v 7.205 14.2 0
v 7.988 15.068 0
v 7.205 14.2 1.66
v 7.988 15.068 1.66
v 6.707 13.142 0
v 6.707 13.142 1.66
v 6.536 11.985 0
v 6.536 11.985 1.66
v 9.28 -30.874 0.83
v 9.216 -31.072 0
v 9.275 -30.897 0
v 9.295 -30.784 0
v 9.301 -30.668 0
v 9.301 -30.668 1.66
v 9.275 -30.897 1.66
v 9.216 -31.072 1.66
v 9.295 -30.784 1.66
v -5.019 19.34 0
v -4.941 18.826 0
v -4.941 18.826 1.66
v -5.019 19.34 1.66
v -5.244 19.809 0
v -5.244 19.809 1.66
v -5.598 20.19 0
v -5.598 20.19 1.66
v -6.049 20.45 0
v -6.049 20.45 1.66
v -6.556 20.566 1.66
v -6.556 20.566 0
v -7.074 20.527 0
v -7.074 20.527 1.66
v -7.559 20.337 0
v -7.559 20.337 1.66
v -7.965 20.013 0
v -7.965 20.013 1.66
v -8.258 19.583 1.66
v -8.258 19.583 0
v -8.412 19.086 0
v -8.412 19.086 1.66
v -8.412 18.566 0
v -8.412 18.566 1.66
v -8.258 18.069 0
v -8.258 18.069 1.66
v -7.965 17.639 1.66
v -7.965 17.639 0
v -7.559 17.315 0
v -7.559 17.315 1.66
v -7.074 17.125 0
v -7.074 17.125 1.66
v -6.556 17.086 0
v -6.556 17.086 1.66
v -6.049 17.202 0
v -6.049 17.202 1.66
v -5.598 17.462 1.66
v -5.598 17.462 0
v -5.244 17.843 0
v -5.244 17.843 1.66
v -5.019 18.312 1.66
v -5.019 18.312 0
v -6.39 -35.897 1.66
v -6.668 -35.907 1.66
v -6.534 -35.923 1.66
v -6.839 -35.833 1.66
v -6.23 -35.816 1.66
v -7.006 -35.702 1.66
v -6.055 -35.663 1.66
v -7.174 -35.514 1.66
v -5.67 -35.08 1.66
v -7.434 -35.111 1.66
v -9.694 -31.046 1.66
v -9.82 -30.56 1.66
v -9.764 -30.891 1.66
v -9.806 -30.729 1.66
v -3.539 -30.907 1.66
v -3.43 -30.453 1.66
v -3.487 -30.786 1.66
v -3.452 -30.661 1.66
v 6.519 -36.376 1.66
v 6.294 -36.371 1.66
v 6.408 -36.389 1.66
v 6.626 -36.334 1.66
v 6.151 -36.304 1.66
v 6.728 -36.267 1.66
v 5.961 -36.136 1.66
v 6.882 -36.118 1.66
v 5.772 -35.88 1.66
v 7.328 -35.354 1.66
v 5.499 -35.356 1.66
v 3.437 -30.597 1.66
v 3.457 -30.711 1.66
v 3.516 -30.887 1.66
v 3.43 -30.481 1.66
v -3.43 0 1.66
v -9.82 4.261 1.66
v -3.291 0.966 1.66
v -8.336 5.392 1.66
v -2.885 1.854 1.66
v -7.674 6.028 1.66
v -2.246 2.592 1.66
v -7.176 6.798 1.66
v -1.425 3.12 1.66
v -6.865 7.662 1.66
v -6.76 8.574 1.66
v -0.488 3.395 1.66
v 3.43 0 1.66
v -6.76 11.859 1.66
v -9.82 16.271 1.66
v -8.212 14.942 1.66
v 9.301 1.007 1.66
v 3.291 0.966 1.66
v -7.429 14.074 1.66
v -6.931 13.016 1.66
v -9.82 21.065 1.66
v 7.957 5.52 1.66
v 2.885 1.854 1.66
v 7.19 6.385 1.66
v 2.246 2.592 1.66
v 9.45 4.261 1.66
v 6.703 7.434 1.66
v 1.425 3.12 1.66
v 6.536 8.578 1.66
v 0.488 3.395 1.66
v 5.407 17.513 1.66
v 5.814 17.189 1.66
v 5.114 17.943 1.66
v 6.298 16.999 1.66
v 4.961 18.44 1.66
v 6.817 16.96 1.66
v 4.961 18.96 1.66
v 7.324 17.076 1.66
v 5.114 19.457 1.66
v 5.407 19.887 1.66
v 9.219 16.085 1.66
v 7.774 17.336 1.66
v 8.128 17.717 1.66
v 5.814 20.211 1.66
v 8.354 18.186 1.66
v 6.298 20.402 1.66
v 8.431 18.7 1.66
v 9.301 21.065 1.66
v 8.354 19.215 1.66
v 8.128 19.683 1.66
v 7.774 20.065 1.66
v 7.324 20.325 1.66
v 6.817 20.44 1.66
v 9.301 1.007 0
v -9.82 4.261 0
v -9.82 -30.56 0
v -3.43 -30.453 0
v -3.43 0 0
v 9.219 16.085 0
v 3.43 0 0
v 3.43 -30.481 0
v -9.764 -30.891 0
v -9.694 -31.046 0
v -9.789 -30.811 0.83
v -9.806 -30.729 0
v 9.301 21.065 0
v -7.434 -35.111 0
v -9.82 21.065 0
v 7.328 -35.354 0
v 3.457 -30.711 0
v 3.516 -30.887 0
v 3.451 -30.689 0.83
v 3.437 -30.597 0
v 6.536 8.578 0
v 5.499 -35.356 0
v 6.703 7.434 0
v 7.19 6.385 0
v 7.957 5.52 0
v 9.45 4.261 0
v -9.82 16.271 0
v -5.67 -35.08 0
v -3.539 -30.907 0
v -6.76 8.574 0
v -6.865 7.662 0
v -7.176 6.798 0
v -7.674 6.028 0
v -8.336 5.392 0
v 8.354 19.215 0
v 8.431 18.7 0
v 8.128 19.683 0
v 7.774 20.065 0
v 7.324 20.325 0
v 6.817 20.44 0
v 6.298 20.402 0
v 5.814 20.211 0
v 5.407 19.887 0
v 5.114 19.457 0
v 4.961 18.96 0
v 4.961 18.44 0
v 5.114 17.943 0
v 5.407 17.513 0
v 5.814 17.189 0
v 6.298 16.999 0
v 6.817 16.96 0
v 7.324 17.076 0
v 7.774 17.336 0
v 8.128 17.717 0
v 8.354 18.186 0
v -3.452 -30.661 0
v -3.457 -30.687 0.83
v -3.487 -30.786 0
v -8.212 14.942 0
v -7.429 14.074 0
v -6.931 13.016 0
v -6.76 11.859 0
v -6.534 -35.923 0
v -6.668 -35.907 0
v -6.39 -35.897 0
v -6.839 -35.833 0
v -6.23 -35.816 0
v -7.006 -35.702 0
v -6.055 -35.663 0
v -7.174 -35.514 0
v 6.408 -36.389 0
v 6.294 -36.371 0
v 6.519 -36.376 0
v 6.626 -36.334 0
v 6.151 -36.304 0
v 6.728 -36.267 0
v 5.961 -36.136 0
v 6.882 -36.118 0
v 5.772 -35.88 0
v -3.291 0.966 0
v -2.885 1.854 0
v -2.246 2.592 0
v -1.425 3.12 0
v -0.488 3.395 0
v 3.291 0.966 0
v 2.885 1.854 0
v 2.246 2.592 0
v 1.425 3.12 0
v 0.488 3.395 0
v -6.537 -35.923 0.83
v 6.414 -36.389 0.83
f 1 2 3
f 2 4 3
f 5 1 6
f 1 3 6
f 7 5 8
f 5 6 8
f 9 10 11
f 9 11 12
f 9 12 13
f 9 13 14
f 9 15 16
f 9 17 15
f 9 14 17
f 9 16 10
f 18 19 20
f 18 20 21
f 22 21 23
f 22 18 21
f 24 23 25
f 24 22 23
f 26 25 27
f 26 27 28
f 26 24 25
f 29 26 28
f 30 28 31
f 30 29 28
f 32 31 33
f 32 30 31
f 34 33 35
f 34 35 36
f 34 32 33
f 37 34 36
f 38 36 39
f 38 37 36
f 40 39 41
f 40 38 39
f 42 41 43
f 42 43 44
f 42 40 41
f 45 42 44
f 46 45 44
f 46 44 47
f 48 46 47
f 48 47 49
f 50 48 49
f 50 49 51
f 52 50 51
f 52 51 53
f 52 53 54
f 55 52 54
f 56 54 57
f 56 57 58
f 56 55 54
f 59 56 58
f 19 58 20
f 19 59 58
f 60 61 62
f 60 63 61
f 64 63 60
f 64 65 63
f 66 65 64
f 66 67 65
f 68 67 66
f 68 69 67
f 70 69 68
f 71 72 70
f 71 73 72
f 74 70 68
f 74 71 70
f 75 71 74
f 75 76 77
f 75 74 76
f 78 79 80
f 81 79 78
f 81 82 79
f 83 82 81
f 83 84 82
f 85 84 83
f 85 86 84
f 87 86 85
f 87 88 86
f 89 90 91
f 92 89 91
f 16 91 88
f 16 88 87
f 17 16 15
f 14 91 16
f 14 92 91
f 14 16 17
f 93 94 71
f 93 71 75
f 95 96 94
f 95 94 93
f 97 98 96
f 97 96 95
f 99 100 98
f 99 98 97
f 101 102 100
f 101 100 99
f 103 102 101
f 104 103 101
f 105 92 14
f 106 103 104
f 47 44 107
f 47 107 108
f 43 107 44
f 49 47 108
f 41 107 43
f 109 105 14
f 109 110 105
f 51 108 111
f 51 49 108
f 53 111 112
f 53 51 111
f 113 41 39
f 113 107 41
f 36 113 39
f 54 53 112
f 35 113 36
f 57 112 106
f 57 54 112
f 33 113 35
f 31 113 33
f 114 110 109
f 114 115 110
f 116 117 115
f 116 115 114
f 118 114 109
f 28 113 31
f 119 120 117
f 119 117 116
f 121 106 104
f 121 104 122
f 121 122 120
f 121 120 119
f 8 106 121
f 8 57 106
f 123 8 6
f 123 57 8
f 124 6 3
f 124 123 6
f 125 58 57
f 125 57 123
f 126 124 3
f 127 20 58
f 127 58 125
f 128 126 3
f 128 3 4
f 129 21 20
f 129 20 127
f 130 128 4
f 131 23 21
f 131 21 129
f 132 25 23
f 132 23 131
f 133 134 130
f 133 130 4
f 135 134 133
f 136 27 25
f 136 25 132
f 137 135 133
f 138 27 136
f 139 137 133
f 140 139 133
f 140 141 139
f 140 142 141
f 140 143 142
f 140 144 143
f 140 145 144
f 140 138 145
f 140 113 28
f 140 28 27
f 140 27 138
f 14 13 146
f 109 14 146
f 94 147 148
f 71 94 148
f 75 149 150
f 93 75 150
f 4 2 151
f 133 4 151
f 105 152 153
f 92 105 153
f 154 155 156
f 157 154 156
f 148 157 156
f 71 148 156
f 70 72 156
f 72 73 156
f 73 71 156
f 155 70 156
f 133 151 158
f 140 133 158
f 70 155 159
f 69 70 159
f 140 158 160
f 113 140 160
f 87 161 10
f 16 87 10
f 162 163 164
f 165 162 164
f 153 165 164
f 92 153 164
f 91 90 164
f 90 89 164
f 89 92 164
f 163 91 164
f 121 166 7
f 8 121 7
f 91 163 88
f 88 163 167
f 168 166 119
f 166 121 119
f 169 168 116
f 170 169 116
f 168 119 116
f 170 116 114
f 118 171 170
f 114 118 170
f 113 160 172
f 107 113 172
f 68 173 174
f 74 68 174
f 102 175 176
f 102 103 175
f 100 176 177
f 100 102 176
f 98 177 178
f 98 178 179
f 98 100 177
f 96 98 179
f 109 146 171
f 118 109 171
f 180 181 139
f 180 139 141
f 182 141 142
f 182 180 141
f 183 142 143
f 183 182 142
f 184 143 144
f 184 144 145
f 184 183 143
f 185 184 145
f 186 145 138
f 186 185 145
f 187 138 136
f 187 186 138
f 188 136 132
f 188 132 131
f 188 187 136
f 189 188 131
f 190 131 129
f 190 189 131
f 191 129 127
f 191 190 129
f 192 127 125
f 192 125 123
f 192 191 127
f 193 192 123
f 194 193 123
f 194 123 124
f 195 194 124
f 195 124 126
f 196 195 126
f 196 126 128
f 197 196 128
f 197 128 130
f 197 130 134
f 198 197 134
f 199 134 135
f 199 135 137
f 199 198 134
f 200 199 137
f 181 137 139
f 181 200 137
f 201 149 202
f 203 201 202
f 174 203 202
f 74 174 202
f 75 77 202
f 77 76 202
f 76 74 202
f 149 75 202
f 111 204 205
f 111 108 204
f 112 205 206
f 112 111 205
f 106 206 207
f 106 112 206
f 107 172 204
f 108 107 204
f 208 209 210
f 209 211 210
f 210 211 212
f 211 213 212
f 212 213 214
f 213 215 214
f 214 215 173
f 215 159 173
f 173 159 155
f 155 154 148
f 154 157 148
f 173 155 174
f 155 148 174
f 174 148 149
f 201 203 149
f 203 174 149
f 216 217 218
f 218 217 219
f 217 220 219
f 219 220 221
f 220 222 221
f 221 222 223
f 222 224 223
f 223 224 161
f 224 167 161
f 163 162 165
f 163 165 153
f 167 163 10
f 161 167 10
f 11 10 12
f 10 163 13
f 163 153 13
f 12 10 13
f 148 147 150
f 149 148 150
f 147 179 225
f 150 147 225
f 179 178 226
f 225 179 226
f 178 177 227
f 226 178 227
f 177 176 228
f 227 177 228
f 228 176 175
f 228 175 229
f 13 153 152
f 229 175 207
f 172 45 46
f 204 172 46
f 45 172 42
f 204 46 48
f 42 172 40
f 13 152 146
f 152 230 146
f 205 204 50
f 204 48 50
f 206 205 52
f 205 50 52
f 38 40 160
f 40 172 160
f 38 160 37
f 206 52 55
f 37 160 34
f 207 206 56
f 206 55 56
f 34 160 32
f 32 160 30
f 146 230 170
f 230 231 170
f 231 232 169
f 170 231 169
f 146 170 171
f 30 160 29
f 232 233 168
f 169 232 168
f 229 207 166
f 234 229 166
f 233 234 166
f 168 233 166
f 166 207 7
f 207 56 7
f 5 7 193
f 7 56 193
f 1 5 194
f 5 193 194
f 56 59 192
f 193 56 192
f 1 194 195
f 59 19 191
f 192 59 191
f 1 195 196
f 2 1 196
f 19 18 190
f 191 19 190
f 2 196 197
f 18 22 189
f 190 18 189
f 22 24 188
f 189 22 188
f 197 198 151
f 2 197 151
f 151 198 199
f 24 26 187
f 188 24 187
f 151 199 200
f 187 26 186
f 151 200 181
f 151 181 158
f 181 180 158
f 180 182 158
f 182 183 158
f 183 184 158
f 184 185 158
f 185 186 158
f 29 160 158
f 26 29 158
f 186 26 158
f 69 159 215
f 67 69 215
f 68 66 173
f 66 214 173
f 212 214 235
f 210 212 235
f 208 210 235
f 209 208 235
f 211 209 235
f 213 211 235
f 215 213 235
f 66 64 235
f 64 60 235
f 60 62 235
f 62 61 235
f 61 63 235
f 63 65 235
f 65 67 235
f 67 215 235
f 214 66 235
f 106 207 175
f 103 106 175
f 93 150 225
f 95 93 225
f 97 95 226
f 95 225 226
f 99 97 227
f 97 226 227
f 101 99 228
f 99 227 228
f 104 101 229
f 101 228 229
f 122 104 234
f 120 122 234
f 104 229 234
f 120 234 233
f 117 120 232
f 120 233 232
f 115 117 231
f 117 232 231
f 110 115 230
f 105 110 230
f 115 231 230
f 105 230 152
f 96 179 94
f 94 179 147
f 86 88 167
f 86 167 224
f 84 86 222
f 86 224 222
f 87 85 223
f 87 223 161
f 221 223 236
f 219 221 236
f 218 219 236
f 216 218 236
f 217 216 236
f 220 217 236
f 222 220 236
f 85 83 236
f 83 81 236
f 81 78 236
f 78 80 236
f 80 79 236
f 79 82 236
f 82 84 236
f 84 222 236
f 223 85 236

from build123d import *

# Parameters (mm, degrees)
F0_R         = 1.745
F1_DEPTH     = 1.66
F2_R         = 4
F3_T1_DEPTH  = 11.0406372139
F3_T3_DEPTH  = 2.9562992506
F3_T5_DEPTH  = 2.7192996153
F3_T7_DEPTH  = 12.9650408158
F3_T9_DEPTH  = 2.8625815694
F3_T11_DEPTH = 2.7133982533


# Not quite as in the source:
# - a fillet or chamfer that OpenCascade refuses, or shapes differently, is made with other operations: its cross-section is extruded or revolved along the edge and cut away or added


with BuildPart() as f1:
    # F0 (on Top) → F1 (new body)
    with BuildSketch(Plane.XY):
        with BuildLine():
            Line((9.301183783, 21.0652845629), (-9.82, 21.0652845629))
            Line((-9.82, 21.0652845629), (-9.82, 16.2710778286))
            Line((-9.82, 16.2710778286), (-6.76, 13.7425599752))
            Line((-6.76, 13.7425599752), (-6.76, 6.5925599752))
            Line((-6.76, 6.5925599752), (-9.82, 4.2610778286))
            Line((-9.82, 4.2610778286), (-9.82, 0.8810778286))
            Line((-9.82, 0.8810778286), (-9.82, -30.8189221714))
            Line((-9.82, -30.8189221714), (-6.5227223381, -36.7505173139))
            Line((-6.5227223381, -36.7505173139), (-3.43, -30.6931023543))
            Line((-3.43, -30.6931023543), (-3.43, 0))
            ThreePointArc((-3.43, 0), (0, 3.43), (3.43, 0))
            Line((3.43, 0), (3.43, -30.6931023543))
            Line((3.43, -30.6931023543), (6.4156440855, -37.4231023543))
            Line((6.4156440855, -37.4231023543), (9.301183783, -30.87889562))
            Line((9.301183783, -30.87889562), (9.301183783, 1.0068976457))
            Line((9.301183783, 1.0068976457), (9.4504277734, 4.2610778286))
            Line((9.4504277734, 4.2610778286), (6.5356440855, 6.7183797924))
            Line((6.5356440855, 6.7183797924), (6.5356440855, 13.8683797924))
            Line((6.5356440855, 13.8683797924), (9.2185314492, 16.0852845629))
            Line((9.2185314492, 16.0852845629), (9.301183783, 21.0652845629))
        make_face()
        with Locations((-6.686183783, 18.82610438)):
            Circle(F0_R, mode=Mode.SUBTRACT)
        with Locations((6.686183783, 18.7002845629)):
            Circle(F0_R, mode=Mode.SUBTRACT)
    extrude(amount=F1_DEPTH)

    # F2
    f2_edges = [f1.edges().sort_by_distance(p)[0] for p in [
        (-6.76, 6.59256, 0.83),
        (-6.76, 13.74256, 0.83),
        (6.535644, 6.71838, 0.83),
        (6.535644, 13.86838, 0.83),
    ]]
    fillet(f2_edges, radius=F2_R)

    # F3: fillet of radius 1 on 6 edges, made by hand

    # F3_s2 → F3_t1 (cut)
    with BuildSketch(Plane.XY.offset(-4.690318607)):
        with BuildLine():
            add(Edge.make_bspline(
                [(-7.4342616517, -35.110715417), (-6.5227223381, -36.7505173139), (-5.6695955837, -35.0795807734)],
                knots=[0, 0, 0, 1, 1, 1], degree=2, weights=[1, 1, 1]))
            Line((-5.6695955837, -35.0795807734), (-6.5227223381, -36.7505173139))
            Line((-6.5227223381, -36.7505173139), (-7.4342616517, -35.110715417))
        make_face()
    extrude(amount=F3_T1_DEPTH, mode=Mode.SUBTRACT)

    # F3_s4 → F3_t3 (cut)
    with BuildSketch(Plane.XY.offset(-0.6481496253)):
        with BuildLine():
            add(Edge.make_bspline(
                [(-9.82, -30.5596623213), (-9.82, -30.8189221714), (-9.6940354517, -31.0455244716)],
                knots=[0, 0, 0, 1, 1, 1], degree=2, weights=[1, 1, 1]))
            Line((-9.6940354517, -31.0455244716), (-9.82, -30.8189221714))
            Line((-9.82, -30.8189221714), (-9.82, -30.5596623213))
        make_face()
    extrude(amount=F3_T3_DEPTH, mode=Mode.SUBTRACT)

    # F3_s6 → F3_t5 (cut)
    with BuildSketch(Plane.XY.offset(-0.5296498077)):
        with BuildLine():
            add(Edge.make_bspline(
                [(3.43, -30.4812424312), (3.43, -30.6931023543), (3.5159130776, -30.8867607393)],
                knots=[0, 0, 0, 1, 1, 1], degree=2, weights=[1, 1, 1]))
            Line((3.5159130776, -30.8867607393), (3.43, -30.6931023543))
            Line((3.43, -30.6931023543), (3.43, -30.4812424312))
        make_face()
    extrude(amount=F3_T5_DEPTH, mode=Mode.SUBTRACT)

    # F3_s8 → F3_t7 (cut)
    with BuildSketch(Plane.XY.offset(-5.6525204079)):
        with BuildLine():
            add(Edge.make_bspline(
                [(5.4987638806, -35.3563443608), (6.4156440855, -37.4231023543), (7.3278517341, -35.3542777798)],
                knots=[0, 0, 0, 1, 1, 1], degree=2, weights=[1, 1, 1]))
            Line((7.3278517341, -35.3542777798), (6.4156440855, -37.4231023543))
            Line((6.4156440855, -37.4231023543), (5.4987638806, -35.3563443608))
        make_face()
    extrude(amount=F3_T7_DEPTH, mode=Mode.SUBTRACT)

    # F3_s10 → F3_t9 (cut)
    with BuildSketch(Plane.XY.offset(-0.6012907847)):
        with BuildLine():
            add(Edge.make_bspline(
                [(-3.5393693837, -30.9073135471), (-3.43, -30.6931023543), (-3.43, -30.4525860404)],
                knots=[0, 0, 0, 1, 1, 1], degree=2, weights=[1, 1, 1]))
            Line((-3.43, -30.4525860404), (-3.43, -30.6931023543))
            Line((-3.43, -30.6931023543), (-3.5393693837, -30.9073135471))
        make_face()
    extrude(amount=F3_T9_DEPTH, mode=Mode.SUBTRACT)

    # F3_s12 → F3_t11 (cut)
    with BuildSketch(Plane.XY.offset(-0.5266991266)):
        with BuildLine():
            add(Edge.make_bspline(
                [(9.301183783, -30.6682159693), (9.301183783, -30.87889562), (9.2161847141, -31.0716676965)],
                knots=[0, 0, 0, 1, 1, 1], degree=2, weights=[1, 1, 1]))
            Line((9.2161847141, -31.0716676965), (9.301183783, -30.87889562))
            Line((9.301183783, -30.87889562), (9.301183783, -30.6682159693))
        make_face()
    extrude(amount=F3_T11_DEPTH, mode=Mode.SUBTRACT)


solid = f1.part
